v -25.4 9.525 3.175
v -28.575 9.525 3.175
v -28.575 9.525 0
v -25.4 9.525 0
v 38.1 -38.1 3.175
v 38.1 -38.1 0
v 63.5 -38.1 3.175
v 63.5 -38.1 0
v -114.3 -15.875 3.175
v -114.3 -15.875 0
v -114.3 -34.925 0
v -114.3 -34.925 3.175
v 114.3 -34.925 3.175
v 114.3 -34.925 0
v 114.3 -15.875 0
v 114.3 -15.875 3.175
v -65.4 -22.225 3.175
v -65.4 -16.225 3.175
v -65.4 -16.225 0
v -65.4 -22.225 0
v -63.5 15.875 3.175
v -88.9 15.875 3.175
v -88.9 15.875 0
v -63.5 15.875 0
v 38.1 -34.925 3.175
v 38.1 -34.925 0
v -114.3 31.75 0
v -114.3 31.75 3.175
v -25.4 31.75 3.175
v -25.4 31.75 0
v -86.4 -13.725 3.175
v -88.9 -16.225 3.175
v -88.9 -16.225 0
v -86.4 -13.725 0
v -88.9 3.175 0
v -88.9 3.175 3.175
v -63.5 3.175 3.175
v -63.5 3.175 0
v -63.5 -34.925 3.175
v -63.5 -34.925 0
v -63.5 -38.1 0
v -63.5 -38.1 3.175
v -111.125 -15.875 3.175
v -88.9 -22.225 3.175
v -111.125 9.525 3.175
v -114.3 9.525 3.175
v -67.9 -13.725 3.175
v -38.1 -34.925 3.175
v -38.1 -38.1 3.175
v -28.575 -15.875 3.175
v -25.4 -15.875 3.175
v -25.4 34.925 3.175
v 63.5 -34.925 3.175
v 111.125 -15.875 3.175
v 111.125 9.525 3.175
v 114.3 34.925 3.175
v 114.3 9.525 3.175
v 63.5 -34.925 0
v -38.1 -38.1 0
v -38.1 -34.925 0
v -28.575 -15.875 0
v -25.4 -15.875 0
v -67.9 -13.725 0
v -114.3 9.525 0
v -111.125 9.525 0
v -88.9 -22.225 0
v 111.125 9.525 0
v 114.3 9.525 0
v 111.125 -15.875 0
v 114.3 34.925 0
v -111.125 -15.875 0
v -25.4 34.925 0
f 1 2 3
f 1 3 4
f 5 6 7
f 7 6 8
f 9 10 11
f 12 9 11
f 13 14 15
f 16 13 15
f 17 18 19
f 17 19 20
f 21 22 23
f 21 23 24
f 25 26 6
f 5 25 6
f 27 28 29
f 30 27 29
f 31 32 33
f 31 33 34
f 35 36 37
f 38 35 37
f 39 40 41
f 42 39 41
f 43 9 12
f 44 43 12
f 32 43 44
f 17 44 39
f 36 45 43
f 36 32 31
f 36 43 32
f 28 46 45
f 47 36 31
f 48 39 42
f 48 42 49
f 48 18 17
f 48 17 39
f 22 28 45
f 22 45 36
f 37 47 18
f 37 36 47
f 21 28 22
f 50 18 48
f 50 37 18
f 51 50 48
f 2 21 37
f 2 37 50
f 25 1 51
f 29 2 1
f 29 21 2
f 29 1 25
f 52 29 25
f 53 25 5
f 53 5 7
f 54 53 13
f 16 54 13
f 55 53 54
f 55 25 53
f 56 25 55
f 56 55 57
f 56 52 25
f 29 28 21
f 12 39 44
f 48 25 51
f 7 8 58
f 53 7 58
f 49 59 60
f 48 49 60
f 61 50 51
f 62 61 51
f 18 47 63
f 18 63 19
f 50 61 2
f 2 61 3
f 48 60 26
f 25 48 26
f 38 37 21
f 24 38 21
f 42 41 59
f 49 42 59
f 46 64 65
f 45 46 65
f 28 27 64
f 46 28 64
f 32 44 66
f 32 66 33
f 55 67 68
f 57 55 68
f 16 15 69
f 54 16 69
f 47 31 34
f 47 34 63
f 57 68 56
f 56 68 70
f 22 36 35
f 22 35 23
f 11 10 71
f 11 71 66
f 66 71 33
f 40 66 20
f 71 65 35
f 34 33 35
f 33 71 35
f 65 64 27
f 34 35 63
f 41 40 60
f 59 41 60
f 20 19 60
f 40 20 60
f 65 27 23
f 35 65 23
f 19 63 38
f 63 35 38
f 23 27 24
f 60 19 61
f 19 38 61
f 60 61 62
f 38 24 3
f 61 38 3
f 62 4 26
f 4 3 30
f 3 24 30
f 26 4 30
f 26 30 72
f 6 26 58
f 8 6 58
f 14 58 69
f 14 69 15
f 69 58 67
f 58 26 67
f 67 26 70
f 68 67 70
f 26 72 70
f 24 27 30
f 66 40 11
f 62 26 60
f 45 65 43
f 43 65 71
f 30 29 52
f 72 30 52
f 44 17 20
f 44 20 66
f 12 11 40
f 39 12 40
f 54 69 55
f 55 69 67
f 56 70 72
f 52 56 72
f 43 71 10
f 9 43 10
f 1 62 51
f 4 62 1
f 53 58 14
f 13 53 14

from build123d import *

# Parameters (mm, degrees)
SKETCH1_W           = 3.175
SKETCH1_H           = 25.4
BOSS_EXTRUDE1_DEPTH = 3.175
SKETCH2_W           = 25.4
SKETCH2_H           = 12.7
CUT_EXTRUDE1_DEPTH  = 4.175
SKETCH3_W           = 88.9
SKETCH3_H           = 3.175
CUT_EXTRUDE2_DEPTH  = 4.175


with BuildPart() as part:
    # Sketch1 → Boss-Extrude1 (new body)
    with BuildSketch(Plane.XY):
        Polygon((-114.3, 34.925), (-114.3, 9.525), (-111.125, 9.525), (-111.125, -15.875), (-114.3, -15.875), (-114.3, -34.925), (-63.5, -34.925), (-63.5, -38.1), (-38.1, -38.1), (-38.1, -34.925), (38.1, -34.925), (38.1, -38.1), (63.5, -38.1), (63.5, -34.925), (114.3, -34.925), (114.3, -15.875), (111.125, -15.875), (111.125, 9.525), (114.3, 9.525), (114.3, 34.925), align=None)
        with Locations((-26.9875, -3.175)):
            Rectangle(SKETCH1_W, SKETCH1_H, mode=Mode.SUBTRACT)
    extrude(amount=BOSS_EXTRUDE1_DEPTH)

    # Sketch2 → Cut-Extrude1 (cut, through all)
    with BuildSketch(Plane.XY.offset(3.175)):
        Polygon((-88.9, -16.225), (-86.4, -13.725), (-67.9, -13.725), (-65.4, -16.225), (-65.4, -22.225), (-88.9, -22.225), align=None)
        with Locations((-76.2, 9.525)):
            Rectangle(SKETCH2_W, SKETCH2_H)
    extrude(amount=-CUT_EXTRUDE1_DEPTH, mode=Mode.SUBTRACT)

    # Sketch3 → Cut-Extrude2 (cut, through all)
    with BuildSketch(Plane.XY.offset(3.175)):
        with Locations((-69.85, 33.3375)):
            Rectangle(SKETCH3_W, SKETCH3_H)
    extrude(amount=-CUT_EXTRUDE2_DEPTH, mode=Mode.SUBTRACT)


solid = part.part
